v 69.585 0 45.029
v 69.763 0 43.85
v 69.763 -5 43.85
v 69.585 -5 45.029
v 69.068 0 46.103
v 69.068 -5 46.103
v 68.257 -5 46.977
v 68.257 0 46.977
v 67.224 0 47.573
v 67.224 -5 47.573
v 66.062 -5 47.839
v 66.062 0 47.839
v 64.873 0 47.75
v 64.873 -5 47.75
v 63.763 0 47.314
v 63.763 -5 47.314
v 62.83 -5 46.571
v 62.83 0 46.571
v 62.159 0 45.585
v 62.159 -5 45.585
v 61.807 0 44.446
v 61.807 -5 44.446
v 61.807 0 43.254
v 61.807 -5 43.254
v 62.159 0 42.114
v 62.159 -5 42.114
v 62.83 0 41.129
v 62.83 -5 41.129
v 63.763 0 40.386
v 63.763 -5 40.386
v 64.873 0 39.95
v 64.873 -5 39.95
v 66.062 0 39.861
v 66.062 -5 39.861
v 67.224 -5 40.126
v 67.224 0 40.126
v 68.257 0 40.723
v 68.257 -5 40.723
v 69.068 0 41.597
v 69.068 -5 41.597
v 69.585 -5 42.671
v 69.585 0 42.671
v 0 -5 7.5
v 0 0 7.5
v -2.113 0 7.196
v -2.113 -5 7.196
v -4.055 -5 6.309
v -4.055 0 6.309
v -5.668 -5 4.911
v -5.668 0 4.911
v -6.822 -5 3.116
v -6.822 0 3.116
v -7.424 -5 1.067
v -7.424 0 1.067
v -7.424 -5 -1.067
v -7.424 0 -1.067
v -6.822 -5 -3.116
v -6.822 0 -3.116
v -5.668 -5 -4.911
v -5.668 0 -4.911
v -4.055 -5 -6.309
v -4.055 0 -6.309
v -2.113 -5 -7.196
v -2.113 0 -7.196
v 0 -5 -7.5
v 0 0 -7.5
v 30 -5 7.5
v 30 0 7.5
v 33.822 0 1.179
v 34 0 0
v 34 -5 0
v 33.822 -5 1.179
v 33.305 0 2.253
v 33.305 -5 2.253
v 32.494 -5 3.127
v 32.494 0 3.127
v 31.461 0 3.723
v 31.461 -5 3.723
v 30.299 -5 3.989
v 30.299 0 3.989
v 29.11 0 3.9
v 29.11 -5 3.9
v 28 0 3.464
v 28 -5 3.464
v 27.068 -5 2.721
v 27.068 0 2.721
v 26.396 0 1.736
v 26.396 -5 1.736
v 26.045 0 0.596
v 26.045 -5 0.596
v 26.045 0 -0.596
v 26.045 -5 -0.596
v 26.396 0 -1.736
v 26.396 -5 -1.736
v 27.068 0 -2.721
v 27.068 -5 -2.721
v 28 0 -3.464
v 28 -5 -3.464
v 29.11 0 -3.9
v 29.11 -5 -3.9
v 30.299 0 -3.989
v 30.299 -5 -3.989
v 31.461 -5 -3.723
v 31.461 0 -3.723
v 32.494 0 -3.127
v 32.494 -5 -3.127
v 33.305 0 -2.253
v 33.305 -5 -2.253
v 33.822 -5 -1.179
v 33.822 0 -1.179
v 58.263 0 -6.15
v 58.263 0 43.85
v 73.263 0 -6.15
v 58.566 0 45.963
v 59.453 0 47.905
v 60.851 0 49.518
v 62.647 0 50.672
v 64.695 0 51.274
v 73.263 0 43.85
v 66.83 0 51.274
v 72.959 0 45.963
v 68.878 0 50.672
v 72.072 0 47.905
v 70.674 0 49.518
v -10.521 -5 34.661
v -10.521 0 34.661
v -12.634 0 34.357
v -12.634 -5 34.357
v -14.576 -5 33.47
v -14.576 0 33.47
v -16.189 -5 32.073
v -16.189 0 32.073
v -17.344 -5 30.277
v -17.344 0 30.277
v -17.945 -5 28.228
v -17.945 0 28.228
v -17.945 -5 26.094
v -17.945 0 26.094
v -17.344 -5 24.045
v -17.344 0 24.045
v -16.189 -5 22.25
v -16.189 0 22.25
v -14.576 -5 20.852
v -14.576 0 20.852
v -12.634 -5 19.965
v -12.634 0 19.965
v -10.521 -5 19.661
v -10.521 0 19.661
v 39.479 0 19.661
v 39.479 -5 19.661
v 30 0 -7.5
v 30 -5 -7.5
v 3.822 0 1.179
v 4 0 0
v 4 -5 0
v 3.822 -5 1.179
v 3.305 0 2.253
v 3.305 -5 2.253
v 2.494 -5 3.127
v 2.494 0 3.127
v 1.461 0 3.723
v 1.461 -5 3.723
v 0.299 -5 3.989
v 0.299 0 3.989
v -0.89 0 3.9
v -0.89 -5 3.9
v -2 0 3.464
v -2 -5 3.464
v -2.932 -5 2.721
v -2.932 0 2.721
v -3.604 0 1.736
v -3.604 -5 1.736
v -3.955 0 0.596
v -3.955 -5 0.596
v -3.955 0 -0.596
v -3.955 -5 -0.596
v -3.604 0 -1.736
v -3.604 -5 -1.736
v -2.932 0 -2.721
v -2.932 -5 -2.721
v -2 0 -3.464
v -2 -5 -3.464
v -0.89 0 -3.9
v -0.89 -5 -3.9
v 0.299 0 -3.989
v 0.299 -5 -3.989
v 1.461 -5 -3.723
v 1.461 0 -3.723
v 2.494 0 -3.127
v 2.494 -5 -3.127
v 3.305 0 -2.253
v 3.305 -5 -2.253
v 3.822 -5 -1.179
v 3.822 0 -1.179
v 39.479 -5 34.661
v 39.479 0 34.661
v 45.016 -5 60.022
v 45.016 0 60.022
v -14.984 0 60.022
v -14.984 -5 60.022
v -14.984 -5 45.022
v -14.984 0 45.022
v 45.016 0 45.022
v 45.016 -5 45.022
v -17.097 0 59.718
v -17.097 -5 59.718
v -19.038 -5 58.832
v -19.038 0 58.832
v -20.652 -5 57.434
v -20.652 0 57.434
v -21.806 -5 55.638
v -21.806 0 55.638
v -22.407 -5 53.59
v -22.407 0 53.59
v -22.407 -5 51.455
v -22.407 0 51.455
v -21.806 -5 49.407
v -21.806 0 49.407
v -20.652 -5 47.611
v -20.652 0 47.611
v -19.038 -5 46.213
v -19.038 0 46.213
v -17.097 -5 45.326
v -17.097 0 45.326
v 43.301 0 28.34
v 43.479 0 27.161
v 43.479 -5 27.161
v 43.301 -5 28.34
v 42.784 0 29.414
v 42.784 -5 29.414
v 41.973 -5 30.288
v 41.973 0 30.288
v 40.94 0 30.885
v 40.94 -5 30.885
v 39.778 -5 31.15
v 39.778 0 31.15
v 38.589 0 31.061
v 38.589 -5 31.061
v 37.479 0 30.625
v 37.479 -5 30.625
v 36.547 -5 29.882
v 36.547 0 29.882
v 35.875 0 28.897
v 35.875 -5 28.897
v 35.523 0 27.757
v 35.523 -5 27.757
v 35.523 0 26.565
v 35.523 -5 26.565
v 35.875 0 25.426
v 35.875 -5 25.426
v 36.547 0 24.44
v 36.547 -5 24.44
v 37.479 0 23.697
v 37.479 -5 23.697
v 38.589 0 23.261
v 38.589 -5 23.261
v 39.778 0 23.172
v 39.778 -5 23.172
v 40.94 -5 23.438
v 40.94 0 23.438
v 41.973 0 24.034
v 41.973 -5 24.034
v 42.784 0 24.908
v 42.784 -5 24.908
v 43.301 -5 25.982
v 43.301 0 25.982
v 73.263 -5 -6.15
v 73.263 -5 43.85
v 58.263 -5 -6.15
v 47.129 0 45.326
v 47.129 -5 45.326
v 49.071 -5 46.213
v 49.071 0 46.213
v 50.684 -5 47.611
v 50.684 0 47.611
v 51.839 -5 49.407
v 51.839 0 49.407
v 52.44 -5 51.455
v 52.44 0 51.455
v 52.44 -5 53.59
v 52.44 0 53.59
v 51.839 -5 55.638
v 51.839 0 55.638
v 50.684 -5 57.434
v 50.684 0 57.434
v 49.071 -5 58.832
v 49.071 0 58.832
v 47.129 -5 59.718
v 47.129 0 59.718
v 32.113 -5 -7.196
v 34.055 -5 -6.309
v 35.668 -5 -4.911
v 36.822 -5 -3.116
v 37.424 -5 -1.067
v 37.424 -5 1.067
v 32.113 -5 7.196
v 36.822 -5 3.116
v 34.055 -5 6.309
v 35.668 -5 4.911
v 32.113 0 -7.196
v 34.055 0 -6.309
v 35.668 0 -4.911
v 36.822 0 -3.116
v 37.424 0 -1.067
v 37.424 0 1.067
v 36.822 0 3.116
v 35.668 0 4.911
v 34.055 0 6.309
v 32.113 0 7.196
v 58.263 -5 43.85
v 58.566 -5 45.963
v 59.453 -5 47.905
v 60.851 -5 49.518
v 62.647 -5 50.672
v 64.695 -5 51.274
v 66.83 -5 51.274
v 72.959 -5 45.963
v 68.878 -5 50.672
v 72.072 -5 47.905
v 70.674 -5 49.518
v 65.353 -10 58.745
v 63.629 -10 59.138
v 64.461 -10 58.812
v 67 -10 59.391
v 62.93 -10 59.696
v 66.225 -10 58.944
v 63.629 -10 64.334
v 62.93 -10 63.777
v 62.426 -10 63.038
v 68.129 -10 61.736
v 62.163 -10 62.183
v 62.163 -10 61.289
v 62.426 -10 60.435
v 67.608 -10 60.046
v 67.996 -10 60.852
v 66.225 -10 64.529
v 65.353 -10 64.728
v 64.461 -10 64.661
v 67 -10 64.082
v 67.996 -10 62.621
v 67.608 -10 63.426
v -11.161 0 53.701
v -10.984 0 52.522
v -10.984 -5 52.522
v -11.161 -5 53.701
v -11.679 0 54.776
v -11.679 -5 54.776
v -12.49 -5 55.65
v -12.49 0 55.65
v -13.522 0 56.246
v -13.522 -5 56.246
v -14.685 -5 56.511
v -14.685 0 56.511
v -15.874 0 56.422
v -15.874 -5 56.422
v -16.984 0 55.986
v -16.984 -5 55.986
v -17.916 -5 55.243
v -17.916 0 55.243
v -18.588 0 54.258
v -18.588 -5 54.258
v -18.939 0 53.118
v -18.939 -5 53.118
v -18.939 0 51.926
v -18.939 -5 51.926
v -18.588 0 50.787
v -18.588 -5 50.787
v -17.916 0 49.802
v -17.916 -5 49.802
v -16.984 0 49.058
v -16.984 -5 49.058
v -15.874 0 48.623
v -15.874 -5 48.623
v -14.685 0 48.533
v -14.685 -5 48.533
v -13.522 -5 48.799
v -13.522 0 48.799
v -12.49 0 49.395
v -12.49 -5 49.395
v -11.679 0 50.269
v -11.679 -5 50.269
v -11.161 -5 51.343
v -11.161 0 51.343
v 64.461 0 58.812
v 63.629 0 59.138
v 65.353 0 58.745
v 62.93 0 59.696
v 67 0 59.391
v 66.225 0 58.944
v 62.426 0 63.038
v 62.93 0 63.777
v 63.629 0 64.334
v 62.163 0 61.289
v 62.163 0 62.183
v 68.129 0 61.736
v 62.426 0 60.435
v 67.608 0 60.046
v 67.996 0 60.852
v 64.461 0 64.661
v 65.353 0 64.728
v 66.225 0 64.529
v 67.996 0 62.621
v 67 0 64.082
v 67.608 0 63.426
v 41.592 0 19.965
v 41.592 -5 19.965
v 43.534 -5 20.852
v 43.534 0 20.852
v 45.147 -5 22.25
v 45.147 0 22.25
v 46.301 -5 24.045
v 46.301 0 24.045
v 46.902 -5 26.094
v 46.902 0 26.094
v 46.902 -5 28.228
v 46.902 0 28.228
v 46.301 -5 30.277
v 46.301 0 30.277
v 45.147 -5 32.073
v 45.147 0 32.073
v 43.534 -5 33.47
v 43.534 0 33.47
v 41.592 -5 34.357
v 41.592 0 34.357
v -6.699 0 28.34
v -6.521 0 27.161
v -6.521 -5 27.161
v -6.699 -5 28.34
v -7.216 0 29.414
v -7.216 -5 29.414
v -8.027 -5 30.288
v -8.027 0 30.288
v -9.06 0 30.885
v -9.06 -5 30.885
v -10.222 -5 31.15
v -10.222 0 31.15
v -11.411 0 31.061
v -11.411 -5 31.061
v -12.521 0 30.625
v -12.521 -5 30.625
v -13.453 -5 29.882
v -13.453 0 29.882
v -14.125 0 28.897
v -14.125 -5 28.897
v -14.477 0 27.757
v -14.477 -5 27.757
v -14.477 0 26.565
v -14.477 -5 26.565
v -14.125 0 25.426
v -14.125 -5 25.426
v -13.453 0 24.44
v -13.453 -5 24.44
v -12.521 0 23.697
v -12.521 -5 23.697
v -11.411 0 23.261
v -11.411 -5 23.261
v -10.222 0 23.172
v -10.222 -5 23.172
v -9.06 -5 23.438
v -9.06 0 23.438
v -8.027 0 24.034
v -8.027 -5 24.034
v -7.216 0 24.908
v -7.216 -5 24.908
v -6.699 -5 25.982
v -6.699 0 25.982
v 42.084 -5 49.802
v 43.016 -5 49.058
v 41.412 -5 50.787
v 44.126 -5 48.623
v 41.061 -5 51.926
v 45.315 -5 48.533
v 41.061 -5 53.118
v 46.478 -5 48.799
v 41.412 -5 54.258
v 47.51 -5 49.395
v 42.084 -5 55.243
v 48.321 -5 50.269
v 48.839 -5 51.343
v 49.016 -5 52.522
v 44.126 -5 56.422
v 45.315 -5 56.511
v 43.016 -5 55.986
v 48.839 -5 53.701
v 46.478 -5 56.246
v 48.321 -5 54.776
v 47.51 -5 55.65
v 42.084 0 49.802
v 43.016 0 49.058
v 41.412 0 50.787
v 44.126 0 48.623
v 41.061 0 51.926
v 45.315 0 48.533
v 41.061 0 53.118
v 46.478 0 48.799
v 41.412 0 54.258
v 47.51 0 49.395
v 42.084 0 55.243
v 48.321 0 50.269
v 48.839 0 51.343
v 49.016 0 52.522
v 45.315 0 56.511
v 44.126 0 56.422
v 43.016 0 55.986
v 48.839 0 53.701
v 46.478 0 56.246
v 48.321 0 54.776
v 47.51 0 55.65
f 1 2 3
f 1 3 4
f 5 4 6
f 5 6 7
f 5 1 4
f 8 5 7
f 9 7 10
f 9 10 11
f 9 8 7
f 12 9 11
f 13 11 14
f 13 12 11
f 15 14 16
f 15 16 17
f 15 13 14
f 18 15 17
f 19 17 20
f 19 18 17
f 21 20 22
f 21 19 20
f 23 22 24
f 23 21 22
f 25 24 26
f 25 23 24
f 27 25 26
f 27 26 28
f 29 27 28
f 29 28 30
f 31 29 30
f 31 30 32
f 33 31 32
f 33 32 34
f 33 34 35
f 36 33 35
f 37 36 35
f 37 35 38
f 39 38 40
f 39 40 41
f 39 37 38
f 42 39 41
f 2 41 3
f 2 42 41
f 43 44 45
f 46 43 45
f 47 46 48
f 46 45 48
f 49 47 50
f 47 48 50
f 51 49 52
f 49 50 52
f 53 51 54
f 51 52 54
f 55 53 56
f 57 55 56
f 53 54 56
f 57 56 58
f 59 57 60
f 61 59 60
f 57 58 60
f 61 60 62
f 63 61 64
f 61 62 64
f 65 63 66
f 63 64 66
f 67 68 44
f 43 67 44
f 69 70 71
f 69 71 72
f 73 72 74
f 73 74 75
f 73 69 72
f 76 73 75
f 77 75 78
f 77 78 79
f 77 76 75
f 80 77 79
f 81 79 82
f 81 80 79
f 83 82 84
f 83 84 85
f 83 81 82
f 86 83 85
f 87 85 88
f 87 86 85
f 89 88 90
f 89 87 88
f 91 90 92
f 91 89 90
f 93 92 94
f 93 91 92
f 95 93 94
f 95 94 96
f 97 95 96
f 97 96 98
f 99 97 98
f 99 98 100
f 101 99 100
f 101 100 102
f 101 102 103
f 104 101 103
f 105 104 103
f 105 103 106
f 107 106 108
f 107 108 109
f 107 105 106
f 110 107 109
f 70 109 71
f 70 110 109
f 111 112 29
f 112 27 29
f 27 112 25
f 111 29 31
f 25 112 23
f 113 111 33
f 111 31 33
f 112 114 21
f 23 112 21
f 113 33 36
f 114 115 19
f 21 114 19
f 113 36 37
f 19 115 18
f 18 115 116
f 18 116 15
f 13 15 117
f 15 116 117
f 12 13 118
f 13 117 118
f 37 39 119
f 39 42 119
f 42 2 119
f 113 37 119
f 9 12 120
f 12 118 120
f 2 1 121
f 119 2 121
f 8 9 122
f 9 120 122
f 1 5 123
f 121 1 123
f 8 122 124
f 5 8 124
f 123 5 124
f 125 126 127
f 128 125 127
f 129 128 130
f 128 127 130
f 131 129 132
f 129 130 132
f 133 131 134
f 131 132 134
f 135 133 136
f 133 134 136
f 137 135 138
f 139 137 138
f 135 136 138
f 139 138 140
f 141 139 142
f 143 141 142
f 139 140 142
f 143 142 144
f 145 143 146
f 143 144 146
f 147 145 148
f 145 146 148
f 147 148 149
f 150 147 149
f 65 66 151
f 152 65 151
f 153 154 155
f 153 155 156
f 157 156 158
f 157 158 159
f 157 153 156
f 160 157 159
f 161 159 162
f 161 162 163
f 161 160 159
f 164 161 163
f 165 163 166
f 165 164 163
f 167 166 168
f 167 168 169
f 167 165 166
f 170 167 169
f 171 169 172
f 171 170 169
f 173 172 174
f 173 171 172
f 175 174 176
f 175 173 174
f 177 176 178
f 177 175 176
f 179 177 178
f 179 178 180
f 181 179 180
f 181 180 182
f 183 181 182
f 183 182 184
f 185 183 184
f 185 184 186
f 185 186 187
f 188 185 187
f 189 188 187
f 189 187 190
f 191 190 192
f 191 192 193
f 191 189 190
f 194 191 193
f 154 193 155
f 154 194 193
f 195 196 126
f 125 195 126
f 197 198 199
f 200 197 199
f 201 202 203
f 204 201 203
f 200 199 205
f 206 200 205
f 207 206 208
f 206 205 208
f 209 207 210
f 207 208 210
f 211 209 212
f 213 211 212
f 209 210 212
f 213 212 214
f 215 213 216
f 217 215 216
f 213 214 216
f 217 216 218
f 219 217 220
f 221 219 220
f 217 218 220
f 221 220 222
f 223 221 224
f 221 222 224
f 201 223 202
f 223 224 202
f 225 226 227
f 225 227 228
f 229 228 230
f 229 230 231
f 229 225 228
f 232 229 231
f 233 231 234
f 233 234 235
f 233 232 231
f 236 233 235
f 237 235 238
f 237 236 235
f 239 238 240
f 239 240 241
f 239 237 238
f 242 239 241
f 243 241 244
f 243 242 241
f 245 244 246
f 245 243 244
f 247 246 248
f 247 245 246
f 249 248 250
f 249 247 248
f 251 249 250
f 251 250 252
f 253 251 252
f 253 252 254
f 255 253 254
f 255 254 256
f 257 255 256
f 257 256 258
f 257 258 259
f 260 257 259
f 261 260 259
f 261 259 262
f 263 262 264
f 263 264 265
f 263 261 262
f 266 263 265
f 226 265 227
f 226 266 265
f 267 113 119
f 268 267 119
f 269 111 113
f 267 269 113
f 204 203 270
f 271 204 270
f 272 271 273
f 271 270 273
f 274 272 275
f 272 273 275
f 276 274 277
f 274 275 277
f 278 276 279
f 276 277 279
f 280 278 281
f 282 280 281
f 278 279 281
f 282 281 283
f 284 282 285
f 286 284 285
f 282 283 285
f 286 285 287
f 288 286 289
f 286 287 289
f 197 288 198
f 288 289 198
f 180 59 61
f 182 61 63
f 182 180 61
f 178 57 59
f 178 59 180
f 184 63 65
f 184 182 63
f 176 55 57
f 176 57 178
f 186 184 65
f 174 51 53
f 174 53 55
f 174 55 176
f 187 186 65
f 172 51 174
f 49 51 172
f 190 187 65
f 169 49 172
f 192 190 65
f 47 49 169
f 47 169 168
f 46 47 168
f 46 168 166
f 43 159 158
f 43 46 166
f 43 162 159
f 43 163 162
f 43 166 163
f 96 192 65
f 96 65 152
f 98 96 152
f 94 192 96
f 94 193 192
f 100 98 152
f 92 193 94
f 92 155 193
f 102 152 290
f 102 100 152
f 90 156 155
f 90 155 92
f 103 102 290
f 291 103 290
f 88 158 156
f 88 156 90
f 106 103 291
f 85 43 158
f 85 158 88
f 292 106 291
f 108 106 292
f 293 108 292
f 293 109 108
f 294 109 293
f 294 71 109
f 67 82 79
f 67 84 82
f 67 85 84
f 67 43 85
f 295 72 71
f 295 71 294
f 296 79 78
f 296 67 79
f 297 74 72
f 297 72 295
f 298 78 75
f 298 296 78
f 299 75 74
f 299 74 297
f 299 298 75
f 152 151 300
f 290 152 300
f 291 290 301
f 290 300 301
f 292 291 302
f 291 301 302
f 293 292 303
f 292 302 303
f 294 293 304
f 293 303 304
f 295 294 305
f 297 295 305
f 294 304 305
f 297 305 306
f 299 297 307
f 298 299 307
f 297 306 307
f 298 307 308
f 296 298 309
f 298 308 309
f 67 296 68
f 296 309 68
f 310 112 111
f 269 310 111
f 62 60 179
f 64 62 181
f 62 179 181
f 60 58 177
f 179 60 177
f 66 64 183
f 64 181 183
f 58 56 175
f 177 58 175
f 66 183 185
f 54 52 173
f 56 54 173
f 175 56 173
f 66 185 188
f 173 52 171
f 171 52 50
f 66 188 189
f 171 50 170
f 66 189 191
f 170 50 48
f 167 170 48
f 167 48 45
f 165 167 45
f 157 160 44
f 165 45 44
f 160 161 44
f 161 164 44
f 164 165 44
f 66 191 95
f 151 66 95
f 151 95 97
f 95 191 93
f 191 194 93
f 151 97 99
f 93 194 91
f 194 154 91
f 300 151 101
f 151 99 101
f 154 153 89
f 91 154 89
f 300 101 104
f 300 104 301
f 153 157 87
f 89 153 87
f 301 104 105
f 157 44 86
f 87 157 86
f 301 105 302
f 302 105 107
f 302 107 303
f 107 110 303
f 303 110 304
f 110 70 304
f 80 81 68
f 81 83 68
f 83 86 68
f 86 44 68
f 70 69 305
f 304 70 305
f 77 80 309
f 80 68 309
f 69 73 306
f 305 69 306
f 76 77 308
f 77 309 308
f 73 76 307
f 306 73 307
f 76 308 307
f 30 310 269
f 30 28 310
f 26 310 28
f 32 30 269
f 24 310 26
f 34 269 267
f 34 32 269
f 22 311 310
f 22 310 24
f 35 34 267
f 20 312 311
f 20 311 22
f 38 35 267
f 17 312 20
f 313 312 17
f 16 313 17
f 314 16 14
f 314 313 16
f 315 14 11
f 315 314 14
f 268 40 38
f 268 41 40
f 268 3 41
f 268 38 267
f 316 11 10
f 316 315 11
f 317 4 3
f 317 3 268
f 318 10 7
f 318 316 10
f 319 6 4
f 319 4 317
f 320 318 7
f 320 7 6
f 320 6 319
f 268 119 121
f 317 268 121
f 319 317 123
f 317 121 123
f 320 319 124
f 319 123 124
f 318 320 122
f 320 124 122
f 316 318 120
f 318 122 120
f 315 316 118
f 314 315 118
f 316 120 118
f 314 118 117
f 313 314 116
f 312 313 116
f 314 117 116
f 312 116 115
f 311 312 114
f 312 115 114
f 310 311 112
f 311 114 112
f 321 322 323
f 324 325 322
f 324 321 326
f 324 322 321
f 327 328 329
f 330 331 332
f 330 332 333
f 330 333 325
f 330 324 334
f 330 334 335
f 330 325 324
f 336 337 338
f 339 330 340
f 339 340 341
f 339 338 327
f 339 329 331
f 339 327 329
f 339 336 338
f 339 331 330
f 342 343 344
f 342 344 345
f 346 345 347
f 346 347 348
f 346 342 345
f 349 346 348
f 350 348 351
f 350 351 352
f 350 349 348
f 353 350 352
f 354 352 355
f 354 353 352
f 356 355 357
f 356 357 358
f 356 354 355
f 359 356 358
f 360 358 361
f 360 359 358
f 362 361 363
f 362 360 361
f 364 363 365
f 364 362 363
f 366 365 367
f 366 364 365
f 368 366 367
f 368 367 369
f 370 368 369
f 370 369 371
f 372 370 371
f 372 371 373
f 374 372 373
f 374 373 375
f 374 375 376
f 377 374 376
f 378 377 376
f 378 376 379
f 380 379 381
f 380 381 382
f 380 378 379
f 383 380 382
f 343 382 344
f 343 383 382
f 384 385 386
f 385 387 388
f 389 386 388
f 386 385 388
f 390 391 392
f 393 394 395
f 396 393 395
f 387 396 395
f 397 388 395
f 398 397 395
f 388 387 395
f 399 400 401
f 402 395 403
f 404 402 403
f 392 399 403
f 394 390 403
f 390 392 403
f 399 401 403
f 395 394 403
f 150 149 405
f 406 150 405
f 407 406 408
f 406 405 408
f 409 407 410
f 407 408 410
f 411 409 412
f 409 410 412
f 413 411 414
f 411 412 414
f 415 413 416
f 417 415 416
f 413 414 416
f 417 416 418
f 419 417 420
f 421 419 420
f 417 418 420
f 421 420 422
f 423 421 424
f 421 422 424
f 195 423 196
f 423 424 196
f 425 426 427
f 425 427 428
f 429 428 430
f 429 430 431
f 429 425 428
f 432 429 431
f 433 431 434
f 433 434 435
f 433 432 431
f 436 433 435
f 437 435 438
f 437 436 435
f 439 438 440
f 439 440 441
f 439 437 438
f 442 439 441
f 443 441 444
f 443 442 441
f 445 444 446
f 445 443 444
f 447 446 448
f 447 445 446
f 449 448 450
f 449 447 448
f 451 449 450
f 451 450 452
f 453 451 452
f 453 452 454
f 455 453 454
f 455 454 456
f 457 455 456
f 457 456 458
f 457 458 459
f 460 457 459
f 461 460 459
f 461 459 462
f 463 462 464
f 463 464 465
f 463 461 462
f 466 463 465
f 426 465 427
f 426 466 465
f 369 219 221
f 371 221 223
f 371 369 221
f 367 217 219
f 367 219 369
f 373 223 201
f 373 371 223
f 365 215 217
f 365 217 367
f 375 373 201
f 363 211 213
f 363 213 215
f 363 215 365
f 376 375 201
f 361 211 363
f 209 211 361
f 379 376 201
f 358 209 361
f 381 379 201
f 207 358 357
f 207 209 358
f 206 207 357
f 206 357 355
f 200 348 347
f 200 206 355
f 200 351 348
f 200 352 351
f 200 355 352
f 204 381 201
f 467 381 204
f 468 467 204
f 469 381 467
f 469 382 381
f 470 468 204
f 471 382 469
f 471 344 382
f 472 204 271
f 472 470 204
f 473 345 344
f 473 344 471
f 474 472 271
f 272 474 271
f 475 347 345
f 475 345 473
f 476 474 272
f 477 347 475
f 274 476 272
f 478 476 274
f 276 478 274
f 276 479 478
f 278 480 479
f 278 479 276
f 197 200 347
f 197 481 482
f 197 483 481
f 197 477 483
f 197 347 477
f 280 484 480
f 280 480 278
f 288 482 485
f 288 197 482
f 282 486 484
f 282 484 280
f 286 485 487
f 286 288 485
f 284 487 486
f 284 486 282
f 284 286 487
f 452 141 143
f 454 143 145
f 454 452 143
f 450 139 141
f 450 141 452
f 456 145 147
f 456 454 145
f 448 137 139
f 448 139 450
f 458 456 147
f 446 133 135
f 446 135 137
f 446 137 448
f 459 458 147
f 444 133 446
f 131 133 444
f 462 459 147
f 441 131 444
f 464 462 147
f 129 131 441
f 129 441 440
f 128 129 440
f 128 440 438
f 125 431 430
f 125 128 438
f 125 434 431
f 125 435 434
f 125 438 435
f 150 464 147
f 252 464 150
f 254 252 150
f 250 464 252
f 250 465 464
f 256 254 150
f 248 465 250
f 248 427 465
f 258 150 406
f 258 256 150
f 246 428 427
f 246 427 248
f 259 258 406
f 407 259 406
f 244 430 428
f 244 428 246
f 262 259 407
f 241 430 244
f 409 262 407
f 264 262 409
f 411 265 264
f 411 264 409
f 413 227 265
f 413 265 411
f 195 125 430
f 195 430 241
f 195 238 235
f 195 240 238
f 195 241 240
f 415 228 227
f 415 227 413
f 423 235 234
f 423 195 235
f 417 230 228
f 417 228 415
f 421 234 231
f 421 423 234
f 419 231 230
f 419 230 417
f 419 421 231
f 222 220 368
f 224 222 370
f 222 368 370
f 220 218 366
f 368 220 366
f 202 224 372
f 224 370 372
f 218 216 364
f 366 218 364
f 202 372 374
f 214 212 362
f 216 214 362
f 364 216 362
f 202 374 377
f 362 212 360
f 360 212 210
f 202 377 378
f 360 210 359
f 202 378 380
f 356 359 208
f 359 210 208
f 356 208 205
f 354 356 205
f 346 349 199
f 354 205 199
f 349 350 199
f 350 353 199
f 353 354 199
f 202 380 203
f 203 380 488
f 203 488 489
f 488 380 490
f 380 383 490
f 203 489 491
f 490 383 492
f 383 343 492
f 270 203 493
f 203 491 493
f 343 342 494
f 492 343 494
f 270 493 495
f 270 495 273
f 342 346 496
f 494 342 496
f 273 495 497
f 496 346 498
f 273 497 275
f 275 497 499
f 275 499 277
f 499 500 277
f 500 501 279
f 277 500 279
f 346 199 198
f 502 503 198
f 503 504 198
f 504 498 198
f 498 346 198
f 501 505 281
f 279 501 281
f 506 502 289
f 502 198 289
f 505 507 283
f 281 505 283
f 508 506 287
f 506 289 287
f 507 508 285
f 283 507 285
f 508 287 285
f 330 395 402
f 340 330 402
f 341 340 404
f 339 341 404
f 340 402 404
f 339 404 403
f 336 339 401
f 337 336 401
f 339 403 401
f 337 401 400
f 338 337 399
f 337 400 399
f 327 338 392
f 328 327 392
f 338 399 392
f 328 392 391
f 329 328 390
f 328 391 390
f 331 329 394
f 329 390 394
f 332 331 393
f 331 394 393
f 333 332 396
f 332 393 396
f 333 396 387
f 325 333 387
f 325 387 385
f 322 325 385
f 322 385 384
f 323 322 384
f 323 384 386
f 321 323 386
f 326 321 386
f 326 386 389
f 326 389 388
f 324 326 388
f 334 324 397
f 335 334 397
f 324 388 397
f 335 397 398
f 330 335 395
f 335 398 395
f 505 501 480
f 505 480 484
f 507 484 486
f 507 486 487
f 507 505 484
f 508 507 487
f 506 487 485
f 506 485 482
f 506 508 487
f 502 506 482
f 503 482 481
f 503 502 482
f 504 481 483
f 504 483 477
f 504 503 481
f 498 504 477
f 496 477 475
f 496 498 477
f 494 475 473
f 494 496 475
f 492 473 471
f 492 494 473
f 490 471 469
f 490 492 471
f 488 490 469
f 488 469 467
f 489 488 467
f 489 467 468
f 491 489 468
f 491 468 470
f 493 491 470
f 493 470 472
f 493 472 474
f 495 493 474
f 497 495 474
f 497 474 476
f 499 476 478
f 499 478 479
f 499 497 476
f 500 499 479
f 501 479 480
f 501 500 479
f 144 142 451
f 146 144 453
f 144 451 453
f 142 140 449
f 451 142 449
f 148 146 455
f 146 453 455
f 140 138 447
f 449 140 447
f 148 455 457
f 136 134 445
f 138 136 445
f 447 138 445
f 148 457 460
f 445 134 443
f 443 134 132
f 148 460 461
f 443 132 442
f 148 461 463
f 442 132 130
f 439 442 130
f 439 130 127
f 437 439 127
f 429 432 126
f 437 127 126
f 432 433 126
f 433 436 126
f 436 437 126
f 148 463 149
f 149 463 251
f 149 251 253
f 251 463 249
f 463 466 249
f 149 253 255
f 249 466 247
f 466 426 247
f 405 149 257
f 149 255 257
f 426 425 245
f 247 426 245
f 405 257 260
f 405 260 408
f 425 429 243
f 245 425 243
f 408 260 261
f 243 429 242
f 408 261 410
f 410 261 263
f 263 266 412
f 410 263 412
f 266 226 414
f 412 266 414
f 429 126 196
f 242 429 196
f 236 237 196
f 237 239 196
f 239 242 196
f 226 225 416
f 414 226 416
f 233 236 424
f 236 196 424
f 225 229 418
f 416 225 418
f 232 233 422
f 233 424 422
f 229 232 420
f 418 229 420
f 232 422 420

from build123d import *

# Parameters (mm, degrees)
F1_R      = 4
F2_DEPTH  = 5
F3_R      = 4
F4_DEPTH  = 5
F5_R      = 4
F6_DEPTH  = 5
F7_R      = 4
F8_DEPTH  = 5
F9_R      = 3
F10_DEPTH = 10


with BuildPart() as f2:
    # F1 (on Front) → F2 (new body)
    with BuildSketch(Plane.XZ):
        with BuildLine():
            Line((30, 7.5), (0, 7.5))
            ThreePointArc((0, 7.5), (-7.5, 0), (0, -7.5))
            Line((0, -7.5), (30, -7.5))
            ThreePointArc((30, -7.5), (37.5, 0), (30, 7.5))
        make_face()
        Circle(F1_R, mode=Mode.SUBTRACT)
        with Locations((30, 0)):
            Circle(F1_R, mode=Mode.SUBTRACT)
    extrude(amount=F2_DEPTH)


with BuildPart() as f4:
    # F3 (on Front) → F4 (new body)
    with BuildSketch(Plane.XZ):
        with BuildLine():
            Line((39.4787162915, 34.6610803902), (-10.5212837085, 34.6610803902))
            ThreePointArc((-10.5212837085, 34.6610803902), (-18.0212837085, 27.1610803902), (-10.5212837085, 19.6610803902))
            Line((-10.5212837085, 19.6610803902), (39.4787162915, 19.6610803902))
            ThreePointArc((39.4787162915, 19.6610803902), (46.9787162915, 27.1610803902), (39.4787162915, 34.6610803902))
        make_face()
        with Locations((-10.5212837085, 27.1610803902)):
            Circle(F3_R, mode=Mode.SUBTRACT)
        with Locations((39.4787162915, 27.1610803902)):
            Circle(F3_R, mode=Mode.SUBTRACT)
    extrude(amount=F4_DEPTH)


with BuildPart() as f6:
    # F5 (on Front) → F6 (new body)
    with BuildSketch(Plane.XZ):
        with BuildLine():
            Line((45.0163689256, 60.0222420692), (-14.9836310744, 60.0222420692))
            ThreePointArc((-14.9836310744, 60.0222420692), (-22.4836310744, 52.5222420692), (-14.9836310744, 45.0222420692))
            Line((-14.9836310744, 45.0222420692), (45.0163689256, 45.0222420692))
            ThreePointArc((45.0163689256, 45.0222420692), (52.5163689256, 52.5222420692), (45.0163689256, 60.0222420692))
        make_face()
        with Locations((-14.9836310744, 52.5222420692)):
            Circle(F5_R, mode=Mode.SUBTRACT)
        with Locations((45.0163689256, 52.5222420692)):
            Circle(F5_R, mode=Mode.SUBTRACT)
    extrude(amount=F6_DEPTH)


with BuildPart() as f8:
    # F7 (on Front) → F8 (new body)
    with BuildSketch(Plane.XZ):
        with BuildLine():
            Line((58.2626014948, 43.849914521), (58.2626014948, -6.150085479))
            Line((58.2626014948, -6.150085479), (73.2626014948, -6.150085479))
            Line((73.2626014948, -6.150085479), (73.2626014948, 43.849914521))
            ThreePointArc((73.2626014948, 43.849914521), (65.7626014948, 51.349914521), (58.2626014948, 43.849914521))
        make_face()
        with Locations((65.7626014948, 43.849914521)):
            Circle(F7_R, mode=Mode.SUBTRACT)
    extrude(amount=F8_DEPTH)


with BuildPart() as f10:
    # F9 (on Front) → F10 (new body)
    with BuildSketch(Plane.XZ):
        with Locations((65.1290416718, 61.7363639176)):
            Circle(F9_R)
    extrude(amount=F10_DEPTH)


solid = Compound([f2.part, f4.part, f6.part, f8.part, f10.part])
